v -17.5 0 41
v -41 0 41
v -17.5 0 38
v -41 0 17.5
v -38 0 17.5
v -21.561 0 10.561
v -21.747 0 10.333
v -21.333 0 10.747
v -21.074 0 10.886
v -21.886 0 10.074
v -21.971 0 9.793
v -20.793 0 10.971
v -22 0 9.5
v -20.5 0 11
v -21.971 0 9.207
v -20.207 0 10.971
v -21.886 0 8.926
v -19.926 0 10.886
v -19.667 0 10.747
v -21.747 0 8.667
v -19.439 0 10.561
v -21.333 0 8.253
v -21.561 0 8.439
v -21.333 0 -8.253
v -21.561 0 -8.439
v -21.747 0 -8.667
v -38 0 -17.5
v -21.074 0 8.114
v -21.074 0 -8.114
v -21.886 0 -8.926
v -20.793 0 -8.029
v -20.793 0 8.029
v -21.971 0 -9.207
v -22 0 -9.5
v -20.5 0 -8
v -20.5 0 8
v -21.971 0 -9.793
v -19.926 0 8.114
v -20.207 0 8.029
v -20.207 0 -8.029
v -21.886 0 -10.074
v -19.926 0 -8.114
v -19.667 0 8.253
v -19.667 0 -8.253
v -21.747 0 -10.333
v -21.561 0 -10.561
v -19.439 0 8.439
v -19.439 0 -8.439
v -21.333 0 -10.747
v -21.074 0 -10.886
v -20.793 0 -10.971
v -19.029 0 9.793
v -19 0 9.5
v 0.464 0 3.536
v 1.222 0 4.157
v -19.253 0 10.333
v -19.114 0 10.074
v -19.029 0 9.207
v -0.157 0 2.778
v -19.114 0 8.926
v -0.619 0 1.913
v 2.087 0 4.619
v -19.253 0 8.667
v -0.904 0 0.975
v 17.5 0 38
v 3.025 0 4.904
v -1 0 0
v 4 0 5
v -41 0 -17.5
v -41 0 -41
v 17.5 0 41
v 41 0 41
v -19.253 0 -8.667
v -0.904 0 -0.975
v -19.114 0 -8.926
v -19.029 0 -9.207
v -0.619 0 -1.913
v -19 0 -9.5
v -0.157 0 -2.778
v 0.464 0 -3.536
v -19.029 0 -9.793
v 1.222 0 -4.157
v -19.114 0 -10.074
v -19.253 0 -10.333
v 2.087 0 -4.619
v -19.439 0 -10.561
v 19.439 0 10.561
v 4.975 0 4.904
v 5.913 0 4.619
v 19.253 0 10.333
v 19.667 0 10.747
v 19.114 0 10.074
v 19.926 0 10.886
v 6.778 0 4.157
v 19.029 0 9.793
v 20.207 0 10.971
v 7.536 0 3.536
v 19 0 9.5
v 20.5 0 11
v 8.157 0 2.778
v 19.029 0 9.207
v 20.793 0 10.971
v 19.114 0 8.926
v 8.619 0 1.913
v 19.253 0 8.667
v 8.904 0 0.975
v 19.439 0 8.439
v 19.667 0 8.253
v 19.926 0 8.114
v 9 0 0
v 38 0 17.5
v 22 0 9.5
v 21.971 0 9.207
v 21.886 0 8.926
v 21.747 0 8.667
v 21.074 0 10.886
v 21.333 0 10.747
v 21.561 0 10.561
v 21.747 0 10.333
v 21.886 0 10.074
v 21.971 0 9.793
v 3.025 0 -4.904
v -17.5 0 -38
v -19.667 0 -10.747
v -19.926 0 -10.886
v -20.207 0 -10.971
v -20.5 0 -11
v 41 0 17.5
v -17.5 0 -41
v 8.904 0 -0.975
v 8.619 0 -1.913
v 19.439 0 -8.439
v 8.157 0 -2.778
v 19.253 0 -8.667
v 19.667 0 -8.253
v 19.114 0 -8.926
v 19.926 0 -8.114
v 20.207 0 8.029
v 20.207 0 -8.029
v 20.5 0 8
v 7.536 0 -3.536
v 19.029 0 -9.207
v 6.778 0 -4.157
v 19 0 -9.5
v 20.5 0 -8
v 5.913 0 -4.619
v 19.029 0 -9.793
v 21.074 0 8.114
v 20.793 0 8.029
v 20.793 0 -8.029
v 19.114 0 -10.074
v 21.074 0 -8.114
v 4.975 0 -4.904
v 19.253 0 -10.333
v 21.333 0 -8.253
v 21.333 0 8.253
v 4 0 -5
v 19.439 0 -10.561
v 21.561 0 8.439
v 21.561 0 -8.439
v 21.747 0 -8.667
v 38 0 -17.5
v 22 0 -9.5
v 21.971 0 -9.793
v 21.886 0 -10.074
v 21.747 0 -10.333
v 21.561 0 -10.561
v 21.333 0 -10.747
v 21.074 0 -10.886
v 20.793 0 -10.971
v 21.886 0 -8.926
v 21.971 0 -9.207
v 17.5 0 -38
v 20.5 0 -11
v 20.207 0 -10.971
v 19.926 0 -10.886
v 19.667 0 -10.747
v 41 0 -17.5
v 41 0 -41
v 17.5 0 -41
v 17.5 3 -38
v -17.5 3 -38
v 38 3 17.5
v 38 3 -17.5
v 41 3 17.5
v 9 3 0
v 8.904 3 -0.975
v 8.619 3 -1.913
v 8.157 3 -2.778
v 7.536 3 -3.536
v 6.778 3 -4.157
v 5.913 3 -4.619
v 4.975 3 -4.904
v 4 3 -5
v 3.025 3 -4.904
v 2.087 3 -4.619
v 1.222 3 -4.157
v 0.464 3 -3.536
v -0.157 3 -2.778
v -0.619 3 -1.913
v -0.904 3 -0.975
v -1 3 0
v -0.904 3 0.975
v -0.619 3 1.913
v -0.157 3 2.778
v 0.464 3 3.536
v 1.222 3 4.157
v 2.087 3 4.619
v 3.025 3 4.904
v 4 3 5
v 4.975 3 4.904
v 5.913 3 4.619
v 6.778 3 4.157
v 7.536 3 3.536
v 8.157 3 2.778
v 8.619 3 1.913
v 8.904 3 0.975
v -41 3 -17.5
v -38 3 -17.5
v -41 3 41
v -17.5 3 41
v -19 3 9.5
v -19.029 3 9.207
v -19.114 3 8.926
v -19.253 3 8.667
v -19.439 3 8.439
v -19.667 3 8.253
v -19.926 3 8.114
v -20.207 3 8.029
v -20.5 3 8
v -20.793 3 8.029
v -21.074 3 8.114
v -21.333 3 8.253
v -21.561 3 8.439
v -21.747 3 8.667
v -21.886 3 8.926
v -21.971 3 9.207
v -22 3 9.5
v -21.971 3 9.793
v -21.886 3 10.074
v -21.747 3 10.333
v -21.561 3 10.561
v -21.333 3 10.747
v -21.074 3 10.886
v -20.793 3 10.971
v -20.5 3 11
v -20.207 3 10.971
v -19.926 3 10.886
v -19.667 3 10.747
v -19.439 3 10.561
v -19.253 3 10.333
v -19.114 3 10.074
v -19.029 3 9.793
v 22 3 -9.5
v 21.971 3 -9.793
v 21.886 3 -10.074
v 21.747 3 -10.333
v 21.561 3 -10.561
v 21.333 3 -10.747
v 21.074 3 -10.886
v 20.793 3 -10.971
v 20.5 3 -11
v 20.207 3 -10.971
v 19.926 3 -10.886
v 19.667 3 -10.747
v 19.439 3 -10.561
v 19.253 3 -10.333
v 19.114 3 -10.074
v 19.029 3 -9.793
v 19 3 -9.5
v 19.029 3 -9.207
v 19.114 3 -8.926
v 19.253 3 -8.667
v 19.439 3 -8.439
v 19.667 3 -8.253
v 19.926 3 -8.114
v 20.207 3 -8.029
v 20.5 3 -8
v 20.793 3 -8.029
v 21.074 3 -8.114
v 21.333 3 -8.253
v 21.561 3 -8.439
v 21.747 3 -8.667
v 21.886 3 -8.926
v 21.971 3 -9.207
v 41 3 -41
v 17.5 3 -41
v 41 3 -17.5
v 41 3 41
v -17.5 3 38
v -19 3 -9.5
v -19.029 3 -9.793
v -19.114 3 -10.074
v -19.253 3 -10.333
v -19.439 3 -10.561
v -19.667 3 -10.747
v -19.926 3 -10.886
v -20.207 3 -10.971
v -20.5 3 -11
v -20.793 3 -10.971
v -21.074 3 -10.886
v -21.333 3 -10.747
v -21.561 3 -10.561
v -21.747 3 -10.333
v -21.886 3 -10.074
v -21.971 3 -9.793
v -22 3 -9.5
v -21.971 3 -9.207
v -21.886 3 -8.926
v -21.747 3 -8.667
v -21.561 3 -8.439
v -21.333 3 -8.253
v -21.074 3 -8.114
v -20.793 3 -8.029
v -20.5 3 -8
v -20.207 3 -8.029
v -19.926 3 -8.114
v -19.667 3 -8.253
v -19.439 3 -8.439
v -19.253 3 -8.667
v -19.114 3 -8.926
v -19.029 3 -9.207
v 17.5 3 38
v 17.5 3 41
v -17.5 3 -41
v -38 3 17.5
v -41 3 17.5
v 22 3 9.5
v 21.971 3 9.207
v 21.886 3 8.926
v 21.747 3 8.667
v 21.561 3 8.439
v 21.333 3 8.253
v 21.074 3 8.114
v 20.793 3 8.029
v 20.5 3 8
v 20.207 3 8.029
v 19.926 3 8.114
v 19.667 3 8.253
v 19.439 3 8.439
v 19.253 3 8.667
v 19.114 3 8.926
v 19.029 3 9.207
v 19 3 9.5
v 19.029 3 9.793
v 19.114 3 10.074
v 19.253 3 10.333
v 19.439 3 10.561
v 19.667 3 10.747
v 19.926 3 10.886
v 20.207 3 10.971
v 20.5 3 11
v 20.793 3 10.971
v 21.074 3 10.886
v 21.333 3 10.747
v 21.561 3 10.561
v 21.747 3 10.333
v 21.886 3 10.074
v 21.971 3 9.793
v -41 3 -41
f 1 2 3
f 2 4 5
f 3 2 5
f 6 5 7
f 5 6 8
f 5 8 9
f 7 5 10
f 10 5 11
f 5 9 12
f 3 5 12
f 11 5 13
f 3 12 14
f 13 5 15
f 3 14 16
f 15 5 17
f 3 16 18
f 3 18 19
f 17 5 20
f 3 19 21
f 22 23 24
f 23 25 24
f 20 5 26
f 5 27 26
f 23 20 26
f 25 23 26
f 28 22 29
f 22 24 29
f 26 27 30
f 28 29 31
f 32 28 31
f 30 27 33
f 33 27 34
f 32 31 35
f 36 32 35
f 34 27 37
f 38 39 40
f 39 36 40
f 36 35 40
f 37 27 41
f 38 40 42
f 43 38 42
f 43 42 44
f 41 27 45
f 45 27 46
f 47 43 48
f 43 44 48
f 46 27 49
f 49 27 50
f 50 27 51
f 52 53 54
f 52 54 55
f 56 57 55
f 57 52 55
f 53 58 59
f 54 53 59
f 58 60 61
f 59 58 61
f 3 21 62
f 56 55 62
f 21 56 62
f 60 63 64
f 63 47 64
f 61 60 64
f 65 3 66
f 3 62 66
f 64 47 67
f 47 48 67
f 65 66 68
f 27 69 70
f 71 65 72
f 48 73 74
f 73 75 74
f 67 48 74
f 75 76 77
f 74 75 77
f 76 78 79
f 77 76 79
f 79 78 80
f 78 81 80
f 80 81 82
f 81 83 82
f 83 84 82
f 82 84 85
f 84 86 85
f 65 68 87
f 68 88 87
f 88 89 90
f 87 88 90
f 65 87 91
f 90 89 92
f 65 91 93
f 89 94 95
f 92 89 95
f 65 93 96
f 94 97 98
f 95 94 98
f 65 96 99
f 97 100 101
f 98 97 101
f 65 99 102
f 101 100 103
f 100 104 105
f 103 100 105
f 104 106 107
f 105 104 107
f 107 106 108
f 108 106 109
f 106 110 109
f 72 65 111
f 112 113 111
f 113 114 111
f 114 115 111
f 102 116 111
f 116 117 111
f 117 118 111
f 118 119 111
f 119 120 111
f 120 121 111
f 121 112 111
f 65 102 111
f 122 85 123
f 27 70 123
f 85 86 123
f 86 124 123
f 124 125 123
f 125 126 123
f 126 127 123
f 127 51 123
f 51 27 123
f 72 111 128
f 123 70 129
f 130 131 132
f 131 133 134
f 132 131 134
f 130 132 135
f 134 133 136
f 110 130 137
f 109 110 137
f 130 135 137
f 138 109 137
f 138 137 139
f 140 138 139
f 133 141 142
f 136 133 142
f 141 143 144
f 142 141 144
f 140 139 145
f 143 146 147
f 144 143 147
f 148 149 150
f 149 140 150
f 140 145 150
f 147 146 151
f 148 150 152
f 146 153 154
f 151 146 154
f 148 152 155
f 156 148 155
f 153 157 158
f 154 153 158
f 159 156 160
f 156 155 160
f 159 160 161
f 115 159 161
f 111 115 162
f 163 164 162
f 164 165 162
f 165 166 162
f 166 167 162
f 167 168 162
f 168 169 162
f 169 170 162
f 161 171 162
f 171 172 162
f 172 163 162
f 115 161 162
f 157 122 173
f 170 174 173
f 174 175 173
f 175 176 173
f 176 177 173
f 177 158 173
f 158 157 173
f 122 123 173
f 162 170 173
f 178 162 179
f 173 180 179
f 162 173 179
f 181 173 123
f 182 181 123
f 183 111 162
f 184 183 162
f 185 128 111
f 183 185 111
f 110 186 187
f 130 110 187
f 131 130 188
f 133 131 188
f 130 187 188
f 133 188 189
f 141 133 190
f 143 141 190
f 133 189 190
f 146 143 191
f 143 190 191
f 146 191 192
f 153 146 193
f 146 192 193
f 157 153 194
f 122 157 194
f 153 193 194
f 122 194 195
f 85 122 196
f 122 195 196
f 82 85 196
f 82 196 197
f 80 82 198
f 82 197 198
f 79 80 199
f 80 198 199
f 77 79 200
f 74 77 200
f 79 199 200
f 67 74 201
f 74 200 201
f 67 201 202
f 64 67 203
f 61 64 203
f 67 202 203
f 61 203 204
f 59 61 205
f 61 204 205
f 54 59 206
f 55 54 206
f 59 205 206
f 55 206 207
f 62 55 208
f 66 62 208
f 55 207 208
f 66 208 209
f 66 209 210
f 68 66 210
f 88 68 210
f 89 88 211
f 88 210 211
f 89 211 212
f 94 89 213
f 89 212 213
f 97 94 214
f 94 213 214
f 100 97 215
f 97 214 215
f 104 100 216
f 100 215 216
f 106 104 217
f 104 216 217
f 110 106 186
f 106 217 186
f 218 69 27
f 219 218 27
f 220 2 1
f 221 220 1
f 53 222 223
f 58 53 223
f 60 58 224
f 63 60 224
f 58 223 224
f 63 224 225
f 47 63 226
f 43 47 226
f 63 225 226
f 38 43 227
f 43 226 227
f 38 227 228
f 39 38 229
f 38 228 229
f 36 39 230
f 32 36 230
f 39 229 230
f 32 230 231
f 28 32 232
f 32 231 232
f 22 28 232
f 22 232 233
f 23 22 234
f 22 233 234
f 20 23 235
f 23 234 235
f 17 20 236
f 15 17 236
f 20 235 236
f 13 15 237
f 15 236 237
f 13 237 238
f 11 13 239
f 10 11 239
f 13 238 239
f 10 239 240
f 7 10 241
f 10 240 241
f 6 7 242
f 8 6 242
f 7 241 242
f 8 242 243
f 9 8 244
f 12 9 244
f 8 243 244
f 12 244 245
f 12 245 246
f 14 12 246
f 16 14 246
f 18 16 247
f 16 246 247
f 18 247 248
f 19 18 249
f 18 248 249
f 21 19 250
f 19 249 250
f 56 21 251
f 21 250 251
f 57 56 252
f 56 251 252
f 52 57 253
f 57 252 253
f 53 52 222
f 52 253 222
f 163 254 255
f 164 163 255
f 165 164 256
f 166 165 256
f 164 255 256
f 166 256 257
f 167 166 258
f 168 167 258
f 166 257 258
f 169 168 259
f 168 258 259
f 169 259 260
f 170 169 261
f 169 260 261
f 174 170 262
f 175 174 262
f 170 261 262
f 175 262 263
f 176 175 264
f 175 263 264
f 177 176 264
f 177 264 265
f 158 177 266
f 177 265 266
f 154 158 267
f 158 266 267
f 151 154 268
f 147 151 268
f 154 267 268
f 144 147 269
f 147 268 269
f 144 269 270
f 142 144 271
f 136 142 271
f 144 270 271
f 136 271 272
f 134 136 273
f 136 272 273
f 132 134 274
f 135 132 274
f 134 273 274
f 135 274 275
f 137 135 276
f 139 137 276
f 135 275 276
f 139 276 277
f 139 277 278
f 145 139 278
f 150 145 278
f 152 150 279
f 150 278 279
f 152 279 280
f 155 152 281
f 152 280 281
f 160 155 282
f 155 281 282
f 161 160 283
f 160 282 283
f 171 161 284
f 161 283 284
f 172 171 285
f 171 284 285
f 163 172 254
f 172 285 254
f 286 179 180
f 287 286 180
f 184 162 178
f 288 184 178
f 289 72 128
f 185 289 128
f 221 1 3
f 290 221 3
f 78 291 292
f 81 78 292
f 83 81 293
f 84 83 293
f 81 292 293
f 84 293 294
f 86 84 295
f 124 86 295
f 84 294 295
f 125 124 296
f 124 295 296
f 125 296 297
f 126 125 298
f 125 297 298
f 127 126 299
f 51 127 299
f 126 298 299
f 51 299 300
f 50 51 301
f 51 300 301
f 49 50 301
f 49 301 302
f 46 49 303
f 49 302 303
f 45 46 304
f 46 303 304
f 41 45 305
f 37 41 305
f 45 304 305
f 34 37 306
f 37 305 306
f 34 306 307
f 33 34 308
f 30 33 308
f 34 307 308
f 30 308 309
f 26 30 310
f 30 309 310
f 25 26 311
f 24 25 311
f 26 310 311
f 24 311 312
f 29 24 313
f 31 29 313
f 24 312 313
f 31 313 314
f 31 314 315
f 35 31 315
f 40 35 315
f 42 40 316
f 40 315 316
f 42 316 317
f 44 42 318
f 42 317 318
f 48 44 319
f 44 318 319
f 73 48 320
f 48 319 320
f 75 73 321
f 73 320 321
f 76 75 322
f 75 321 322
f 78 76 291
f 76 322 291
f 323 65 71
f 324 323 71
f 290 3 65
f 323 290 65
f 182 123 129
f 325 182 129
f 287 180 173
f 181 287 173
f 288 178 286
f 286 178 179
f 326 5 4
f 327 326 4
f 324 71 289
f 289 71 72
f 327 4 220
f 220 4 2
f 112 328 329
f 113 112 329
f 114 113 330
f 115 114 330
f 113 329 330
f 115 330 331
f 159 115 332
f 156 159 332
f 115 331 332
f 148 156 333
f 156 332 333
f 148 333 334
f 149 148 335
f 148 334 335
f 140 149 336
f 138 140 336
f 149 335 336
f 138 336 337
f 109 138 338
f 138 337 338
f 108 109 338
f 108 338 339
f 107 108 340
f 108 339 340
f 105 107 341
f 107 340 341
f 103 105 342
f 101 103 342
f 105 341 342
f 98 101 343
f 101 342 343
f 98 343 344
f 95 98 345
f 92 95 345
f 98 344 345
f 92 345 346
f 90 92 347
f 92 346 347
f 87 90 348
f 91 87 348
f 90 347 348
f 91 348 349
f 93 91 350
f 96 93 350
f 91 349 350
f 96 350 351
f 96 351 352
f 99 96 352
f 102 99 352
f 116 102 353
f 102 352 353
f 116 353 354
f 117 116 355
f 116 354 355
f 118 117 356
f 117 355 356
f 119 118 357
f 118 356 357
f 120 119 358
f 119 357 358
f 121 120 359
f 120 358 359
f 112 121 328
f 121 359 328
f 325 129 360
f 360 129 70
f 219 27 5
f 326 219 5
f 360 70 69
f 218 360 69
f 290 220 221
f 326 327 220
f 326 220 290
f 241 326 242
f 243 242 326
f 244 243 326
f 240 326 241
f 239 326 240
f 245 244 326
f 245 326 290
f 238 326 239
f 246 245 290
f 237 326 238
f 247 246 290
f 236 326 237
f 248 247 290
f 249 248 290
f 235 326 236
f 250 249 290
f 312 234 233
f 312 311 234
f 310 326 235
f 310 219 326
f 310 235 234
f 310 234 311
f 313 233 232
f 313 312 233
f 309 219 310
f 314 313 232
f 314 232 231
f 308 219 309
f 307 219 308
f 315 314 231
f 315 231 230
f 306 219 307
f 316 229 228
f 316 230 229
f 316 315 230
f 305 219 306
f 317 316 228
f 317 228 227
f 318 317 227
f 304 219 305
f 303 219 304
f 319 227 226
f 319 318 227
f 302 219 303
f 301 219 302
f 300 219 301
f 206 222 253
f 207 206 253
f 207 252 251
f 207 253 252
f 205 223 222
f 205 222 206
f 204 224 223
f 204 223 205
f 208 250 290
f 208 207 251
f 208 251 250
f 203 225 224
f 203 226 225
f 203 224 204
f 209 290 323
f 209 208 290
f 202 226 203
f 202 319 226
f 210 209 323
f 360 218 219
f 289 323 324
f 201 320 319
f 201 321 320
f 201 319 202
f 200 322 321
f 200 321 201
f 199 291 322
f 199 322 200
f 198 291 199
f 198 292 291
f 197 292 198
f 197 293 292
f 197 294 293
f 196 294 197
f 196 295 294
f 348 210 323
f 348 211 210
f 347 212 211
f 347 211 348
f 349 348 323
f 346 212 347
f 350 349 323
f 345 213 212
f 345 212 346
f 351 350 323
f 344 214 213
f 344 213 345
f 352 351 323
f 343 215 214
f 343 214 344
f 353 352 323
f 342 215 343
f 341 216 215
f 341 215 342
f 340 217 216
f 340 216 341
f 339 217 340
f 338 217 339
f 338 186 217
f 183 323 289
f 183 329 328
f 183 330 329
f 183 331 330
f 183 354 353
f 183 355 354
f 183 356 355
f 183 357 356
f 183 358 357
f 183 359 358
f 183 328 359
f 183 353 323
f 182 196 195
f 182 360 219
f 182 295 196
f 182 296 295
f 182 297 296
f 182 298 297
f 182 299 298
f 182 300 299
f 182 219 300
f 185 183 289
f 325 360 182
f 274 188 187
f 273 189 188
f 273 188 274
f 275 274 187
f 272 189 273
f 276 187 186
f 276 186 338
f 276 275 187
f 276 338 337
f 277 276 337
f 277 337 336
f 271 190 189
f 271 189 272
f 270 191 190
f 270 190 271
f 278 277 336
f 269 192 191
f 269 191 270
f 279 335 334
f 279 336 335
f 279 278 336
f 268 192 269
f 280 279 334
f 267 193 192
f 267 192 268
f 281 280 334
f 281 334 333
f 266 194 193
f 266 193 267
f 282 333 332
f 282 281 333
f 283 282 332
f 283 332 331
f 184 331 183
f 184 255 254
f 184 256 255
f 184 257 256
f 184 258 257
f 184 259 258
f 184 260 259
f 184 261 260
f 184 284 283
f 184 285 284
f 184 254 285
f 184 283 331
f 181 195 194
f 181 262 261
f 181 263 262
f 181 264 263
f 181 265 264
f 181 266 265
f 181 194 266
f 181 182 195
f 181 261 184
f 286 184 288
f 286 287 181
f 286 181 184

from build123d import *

# Parameters (mm, degrees)
BOSS_EXTRUDE1_DEPTH = 3
SKETCH2_R           = 5
SKETCH2_R_2         = 1.5
CUT_EXTRUDE1_DEPTH  = 3


with BuildPart() as part:
    # Sketch1 → Boss-Extrude1 (new body)
    with BuildSketch(Plane(origin=(0, 0, 0), x_dir=(1, 0, 0), z_dir=(0, 1, 0))):
        Polygon((-41, -41), (-17.5, -41), (-17.5, -38), (17.5, -38), (17.5, -41), (41, -41), (41, -17.5), (38, -17.5), (38, 17.5), (41, 17.5), (41, 41), (17.5, 41), (17.5, 38), (-17.5, 38), (-17.5, 41), (-41, 41), (-41, 17.5), (-38, 17.5), (-38, -17.5), (-41, -17.5), align=None)
    extrude(amount=BOSS_EXTRUDE1_DEPTH)

    # Sketch2 → Cut-Extrude1 (cut)
    with BuildSketch(Plane(origin=(0, 3, 0), x_dir=(1, 0, 0), z_dir=(0, 1, 0))):
        with Locations((4, 0)):
            Circle(SKETCH2_R)
        with Locations((-20.5, 9.5)):
            Circle(SKETCH2_R_2)
        with Locations((-20.5, -9.5)):
            Circle(SKETCH2_R_2)
        with Locations((20.5, -9.5)):
            Circle(SKETCH2_R_2)
        with Locations((20.5, 9.5)):
            Circle(SKETCH2_R_2)
    extrude(amount=-CUT_EXTRUDE1_DEPTH, mode=Mode.SUBTRACT)


solid = part.part
